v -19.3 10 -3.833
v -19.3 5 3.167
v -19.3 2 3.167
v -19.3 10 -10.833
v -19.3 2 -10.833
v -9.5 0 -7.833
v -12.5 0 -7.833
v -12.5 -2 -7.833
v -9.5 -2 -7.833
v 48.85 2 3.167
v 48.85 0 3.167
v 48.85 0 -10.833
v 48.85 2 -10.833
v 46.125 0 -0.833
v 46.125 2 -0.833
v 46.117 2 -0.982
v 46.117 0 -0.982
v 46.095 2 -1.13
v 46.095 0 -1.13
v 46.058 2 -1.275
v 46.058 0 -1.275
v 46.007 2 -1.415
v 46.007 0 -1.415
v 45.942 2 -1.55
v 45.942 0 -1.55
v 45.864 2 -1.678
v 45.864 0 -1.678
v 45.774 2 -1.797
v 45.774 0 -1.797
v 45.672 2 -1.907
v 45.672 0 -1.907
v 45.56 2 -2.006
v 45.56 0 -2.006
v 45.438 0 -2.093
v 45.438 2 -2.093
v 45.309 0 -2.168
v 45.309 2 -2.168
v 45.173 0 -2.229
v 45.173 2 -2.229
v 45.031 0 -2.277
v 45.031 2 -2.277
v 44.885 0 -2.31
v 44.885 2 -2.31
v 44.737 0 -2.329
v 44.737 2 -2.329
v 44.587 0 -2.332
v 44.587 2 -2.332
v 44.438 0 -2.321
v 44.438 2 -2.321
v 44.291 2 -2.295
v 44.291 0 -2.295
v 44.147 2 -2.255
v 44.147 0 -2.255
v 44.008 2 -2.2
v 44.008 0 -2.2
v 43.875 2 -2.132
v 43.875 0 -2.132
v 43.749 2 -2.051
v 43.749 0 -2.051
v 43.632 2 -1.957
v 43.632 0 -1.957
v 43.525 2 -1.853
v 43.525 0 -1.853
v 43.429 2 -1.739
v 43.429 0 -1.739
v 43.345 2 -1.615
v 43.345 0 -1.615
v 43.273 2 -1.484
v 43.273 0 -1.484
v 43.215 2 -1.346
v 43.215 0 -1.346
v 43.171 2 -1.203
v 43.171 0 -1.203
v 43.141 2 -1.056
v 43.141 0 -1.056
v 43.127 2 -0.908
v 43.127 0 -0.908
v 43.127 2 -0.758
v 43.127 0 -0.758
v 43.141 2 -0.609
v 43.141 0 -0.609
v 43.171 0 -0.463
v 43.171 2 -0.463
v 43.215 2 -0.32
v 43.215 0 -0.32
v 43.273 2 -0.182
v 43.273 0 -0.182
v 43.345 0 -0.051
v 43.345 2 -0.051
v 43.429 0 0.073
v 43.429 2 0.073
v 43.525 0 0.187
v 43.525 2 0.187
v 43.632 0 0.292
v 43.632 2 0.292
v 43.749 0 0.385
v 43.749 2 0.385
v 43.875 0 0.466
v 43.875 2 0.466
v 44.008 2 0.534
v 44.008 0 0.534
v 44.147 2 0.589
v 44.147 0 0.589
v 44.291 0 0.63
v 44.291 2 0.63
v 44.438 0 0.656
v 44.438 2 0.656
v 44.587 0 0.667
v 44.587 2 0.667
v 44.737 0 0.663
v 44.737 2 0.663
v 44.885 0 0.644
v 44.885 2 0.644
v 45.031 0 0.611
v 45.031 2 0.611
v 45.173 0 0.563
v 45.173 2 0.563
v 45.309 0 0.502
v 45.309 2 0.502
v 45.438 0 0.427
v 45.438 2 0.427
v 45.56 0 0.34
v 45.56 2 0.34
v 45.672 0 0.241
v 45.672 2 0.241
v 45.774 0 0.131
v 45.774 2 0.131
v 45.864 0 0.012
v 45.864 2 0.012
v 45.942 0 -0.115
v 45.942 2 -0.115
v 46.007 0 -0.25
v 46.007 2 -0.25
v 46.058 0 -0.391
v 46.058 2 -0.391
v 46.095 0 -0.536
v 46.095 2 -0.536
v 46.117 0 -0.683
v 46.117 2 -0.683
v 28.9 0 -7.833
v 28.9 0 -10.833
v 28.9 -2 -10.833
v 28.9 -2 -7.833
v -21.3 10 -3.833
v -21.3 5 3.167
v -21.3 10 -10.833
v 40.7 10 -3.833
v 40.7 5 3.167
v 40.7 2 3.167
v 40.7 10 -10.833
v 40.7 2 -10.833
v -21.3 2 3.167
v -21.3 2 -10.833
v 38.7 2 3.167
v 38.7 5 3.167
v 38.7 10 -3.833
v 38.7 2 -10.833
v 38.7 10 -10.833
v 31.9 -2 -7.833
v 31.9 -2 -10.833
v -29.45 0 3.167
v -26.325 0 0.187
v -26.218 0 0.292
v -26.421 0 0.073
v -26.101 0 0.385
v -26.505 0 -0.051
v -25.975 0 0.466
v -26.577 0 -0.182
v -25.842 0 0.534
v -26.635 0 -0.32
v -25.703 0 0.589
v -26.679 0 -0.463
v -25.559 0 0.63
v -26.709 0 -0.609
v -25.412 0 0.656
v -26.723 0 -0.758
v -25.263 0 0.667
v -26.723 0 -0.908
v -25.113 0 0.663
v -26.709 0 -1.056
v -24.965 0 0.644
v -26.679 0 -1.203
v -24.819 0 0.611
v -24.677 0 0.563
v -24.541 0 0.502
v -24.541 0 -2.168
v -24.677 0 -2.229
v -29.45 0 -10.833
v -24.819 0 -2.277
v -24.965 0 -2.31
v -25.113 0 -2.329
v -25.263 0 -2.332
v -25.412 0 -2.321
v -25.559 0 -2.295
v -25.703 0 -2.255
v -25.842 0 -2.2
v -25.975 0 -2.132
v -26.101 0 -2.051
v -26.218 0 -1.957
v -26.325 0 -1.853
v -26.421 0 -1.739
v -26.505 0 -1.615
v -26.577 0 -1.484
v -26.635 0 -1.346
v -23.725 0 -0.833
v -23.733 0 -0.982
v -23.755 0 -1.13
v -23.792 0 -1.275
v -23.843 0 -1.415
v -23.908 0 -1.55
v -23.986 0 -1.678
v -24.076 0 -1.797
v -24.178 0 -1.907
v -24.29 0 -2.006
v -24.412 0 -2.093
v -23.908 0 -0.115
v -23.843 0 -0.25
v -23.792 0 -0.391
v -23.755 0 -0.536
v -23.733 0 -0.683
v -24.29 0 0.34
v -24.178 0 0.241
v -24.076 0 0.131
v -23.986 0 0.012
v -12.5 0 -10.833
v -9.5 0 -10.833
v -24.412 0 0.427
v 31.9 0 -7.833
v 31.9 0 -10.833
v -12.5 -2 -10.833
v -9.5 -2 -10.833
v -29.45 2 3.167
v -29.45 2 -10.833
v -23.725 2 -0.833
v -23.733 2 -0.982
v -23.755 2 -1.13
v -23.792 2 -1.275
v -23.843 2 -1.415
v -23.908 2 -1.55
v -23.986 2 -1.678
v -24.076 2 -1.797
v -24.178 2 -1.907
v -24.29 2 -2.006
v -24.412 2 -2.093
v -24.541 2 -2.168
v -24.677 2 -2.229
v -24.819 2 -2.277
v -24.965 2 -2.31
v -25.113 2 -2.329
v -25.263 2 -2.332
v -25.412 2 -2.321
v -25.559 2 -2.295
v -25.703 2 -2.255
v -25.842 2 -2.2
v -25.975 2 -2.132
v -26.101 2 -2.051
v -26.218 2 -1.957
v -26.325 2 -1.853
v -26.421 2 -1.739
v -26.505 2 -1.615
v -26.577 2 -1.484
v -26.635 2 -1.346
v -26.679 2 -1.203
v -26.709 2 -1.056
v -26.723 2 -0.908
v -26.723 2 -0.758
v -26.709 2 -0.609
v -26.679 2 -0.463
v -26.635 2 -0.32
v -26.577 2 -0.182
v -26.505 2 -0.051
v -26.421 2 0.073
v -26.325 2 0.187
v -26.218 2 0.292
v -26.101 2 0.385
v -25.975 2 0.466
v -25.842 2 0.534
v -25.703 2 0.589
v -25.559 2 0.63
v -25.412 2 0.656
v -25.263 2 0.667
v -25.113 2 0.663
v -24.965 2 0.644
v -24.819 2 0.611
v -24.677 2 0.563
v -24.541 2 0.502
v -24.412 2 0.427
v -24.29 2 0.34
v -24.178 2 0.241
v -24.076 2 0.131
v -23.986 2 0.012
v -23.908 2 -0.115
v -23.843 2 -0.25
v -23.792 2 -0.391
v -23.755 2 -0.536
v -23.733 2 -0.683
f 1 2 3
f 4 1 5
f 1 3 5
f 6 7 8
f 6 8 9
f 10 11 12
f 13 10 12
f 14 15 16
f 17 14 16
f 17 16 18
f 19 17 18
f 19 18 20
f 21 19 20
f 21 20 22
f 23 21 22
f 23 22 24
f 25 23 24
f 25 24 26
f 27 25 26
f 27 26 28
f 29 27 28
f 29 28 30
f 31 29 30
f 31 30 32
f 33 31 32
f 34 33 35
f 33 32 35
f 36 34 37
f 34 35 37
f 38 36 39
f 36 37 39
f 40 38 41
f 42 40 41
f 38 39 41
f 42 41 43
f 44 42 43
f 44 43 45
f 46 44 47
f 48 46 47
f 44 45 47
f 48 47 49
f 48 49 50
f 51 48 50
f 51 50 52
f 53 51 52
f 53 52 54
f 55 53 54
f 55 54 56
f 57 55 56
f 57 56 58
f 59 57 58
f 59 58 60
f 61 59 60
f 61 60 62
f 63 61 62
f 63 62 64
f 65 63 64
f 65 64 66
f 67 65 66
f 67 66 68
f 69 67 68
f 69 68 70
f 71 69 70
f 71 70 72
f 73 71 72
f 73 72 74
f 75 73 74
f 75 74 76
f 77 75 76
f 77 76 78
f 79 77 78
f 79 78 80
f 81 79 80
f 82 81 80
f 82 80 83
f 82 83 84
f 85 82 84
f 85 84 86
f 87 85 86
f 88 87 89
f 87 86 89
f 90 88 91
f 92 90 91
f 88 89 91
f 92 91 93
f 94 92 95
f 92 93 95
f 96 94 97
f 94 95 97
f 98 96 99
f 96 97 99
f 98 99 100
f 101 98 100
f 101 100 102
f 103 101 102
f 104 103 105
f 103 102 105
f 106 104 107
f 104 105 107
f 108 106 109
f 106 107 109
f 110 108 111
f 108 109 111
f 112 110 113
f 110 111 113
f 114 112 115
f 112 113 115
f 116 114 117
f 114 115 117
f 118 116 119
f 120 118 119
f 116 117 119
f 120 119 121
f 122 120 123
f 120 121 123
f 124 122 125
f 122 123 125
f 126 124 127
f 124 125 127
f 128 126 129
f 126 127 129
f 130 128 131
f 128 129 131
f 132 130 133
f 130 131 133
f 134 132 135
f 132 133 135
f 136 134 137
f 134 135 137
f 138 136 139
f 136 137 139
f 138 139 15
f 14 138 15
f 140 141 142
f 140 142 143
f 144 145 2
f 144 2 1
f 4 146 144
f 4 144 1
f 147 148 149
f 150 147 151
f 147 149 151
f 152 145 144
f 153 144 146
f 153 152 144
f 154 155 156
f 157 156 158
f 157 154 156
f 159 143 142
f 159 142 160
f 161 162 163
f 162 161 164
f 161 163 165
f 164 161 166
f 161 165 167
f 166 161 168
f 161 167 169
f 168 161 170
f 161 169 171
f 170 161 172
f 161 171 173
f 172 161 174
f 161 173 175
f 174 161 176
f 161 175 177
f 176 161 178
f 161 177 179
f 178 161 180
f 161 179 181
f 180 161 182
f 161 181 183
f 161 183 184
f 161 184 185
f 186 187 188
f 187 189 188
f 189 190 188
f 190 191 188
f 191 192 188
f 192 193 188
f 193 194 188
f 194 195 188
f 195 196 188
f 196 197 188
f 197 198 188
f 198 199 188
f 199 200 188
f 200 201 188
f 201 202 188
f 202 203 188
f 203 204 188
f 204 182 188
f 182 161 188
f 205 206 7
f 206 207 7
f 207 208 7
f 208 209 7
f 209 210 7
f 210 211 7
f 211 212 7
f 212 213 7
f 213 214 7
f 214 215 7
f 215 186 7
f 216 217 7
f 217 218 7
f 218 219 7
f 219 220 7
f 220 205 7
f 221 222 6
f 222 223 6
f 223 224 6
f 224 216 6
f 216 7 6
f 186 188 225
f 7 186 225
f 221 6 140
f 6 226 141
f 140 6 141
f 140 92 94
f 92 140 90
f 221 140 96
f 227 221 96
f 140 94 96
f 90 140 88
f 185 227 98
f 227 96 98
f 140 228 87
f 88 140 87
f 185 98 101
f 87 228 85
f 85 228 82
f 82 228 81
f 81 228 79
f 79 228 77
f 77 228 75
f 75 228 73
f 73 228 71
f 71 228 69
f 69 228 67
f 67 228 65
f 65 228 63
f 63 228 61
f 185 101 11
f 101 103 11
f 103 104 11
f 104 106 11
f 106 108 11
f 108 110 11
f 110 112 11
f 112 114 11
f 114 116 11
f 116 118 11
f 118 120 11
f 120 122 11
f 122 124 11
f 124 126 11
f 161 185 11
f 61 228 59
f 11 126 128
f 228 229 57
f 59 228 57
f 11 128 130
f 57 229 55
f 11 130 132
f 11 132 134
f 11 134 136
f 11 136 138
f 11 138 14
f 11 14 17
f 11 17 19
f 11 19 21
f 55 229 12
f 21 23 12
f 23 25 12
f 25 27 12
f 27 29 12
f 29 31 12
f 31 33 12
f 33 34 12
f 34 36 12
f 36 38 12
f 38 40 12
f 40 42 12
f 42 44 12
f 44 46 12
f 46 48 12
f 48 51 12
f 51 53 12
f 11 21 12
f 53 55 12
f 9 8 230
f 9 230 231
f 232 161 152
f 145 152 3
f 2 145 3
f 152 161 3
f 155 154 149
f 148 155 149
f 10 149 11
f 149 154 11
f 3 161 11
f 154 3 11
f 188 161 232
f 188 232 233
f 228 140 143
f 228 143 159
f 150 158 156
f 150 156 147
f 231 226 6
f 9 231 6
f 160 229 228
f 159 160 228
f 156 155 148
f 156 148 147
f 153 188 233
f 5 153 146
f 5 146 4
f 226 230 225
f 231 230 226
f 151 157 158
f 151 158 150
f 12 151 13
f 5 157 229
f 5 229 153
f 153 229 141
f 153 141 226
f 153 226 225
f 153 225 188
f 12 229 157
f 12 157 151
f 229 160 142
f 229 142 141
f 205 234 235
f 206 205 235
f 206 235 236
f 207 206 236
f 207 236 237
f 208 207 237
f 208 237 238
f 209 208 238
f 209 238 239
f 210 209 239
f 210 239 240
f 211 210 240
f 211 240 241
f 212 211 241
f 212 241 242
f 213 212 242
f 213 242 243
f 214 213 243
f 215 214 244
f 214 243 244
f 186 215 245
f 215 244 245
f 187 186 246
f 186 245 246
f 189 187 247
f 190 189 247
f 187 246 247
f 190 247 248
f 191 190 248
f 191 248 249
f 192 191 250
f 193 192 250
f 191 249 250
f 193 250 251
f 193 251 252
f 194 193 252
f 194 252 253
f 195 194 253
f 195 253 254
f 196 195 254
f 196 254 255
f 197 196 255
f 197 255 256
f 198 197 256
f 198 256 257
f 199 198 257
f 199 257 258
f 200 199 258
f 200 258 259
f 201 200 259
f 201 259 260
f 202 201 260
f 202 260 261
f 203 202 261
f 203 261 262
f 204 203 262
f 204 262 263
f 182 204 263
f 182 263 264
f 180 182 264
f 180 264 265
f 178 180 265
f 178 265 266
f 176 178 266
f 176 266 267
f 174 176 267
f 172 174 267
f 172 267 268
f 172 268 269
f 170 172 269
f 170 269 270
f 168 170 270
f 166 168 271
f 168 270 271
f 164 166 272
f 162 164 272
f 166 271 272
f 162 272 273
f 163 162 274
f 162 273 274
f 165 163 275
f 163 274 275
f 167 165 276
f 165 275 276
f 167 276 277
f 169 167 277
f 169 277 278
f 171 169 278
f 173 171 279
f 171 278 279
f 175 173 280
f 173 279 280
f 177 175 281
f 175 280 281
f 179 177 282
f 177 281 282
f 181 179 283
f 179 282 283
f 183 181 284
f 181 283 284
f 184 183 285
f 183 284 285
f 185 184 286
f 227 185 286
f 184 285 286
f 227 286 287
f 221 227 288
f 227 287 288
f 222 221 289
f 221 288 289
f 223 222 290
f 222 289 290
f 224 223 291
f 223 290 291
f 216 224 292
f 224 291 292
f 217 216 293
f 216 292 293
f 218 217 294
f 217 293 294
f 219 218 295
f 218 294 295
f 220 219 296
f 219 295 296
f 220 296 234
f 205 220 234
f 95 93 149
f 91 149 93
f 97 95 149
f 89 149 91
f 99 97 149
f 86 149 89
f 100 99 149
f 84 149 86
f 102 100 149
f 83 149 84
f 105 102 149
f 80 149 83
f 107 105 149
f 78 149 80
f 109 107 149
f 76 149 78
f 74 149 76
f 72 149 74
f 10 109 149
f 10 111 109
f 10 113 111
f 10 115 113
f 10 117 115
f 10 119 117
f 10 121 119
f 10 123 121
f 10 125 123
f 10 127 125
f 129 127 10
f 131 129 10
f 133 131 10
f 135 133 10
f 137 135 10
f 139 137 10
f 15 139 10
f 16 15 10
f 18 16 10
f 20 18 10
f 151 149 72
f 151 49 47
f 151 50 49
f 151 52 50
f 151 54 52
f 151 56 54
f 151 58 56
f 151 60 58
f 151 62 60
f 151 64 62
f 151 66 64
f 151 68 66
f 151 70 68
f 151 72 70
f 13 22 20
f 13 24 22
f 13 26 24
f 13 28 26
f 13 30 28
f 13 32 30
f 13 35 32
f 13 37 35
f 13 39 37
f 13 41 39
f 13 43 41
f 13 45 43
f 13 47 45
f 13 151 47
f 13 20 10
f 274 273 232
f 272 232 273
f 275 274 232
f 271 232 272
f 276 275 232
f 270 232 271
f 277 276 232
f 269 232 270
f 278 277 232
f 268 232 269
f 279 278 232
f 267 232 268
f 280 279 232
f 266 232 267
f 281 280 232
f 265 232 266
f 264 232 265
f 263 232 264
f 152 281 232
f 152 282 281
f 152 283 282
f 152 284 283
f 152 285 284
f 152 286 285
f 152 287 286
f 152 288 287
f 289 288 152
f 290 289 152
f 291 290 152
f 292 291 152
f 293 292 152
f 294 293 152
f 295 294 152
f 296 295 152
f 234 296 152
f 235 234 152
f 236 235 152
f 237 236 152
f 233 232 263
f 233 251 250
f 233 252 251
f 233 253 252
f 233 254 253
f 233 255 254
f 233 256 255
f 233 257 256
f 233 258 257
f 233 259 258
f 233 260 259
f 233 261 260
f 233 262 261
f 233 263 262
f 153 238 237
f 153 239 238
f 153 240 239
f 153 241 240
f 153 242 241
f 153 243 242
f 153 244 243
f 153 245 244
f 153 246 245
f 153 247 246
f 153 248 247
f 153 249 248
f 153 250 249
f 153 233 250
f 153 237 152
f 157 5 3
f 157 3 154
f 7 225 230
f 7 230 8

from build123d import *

# Parameters (mm, degrees)
SKETCH1_W               = 78.3
SKETCH1_H               = 14
BOSS_EXTRUDE1_DEPTH     = 2
SKETCH3_R               = 1.5
CUT_EXTRUDE2_DEPTH      = 1
CUT_EXTRUDE2_DEPTH_BACK = 3
SKETCH5_W               = 3
SKETCH5_H               = 3
BOSS_EXTRUDE2_DEPTH     = 2
SKETCH7_W               = 2
SKETCH7_H               = 14
BOSS_EXTRUDE3_DEPTH     = 8
CUT_EXTRUDE6_DEPTH      = 9.15
CUT_EXTRUDE6_DEPTH_BACK = 71.15


with BuildPart() as part:
    # Sketch1 → Boss-Extrude1 (new body)
    with BuildSketch(Plane(origin=(0, 0, 0), x_dir=(1, 0, 0), z_dir=(0, 1, 0))):
        with Locations((9.69964517, 3.832823468)):
            Rectangle(SKETCH1_W, SKETCH1_H)
    extrude(amount=BOSS_EXTRUDE1_DEPTH)

    # Sketch3 → Cut-Extrude2 (cut, two sides)
    with BuildSketch(Plane(origin=(0, 2, 0), x_dir=(1, 0, 0), z_dir=(0, 1, 0))) as cut_extrude2_sk:
        with Locations((-25.22535483, 0.832823468)):
            Circle(SKETCH3_R)
        with Locations((44.62464517, 0.832823468)):
            Circle(SKETCH3_R)
    extrude(amount=CUT_EXTRUDE2_DEPTH, mode=Mode.SUBTRACT)
    extrude(cut_extrude2_sk.sketch, amount=-CUT_EXTRUDE2_DEPTH_BACK, mode=Mode.SUBTRACT)

    # Sketch5 → Boss-Extrude2 (add)
    with BuildSketch(Plane.XZ):
        with Locations((-11.00035483, -9.332823468)):
            Rectangle(SKETCH5_W, SKETCH5_H)
        with Locations((30.39964517, -9.332823468)):
            Rectangle(SKETCH5_W, SKETCH5_H)
    extrude(amount=BOSS_EXTRUDE2_DEPTH)

    # Sketch7 → Boss-Extrude3 (add)
    with BuildSketch(Plane(origin=(0, 2, 0), x_dir=(1, 0, 0), z_dir=(0, 1, 0))):
        with Locations((39.69964517, 3.832823468)):
            Rectangle(SKETCH7_W, SKETCH7_H)
        with Locations((-20.30035483, 3.832823468)):
            Rectangle(SKETCH7_W, SKETCH7_H)
    extrude(amount=BOSS_EXTRUDE3_DEPTH)

    # Sketch9 → Cut-Extrude6 (cut, two sides)
    with BuildSketch(Plane.ZY.offset(21.30035483)) as cut_extrude6_sk:
        Polygon((3.167176532, 10), (3.167176532, 5), (-3.832823468, 10), align=None)
    extrude(amount=CUT_EXTRUDE6_DEPTH, mode=Mode.SUBTRACT)
    extrude(cut_extrude6_sk.sketch, amount=-CUT_EXTRUDE6_DEPTH_BACK, mode=Mode.SUBTRACT)


solid = part.part
